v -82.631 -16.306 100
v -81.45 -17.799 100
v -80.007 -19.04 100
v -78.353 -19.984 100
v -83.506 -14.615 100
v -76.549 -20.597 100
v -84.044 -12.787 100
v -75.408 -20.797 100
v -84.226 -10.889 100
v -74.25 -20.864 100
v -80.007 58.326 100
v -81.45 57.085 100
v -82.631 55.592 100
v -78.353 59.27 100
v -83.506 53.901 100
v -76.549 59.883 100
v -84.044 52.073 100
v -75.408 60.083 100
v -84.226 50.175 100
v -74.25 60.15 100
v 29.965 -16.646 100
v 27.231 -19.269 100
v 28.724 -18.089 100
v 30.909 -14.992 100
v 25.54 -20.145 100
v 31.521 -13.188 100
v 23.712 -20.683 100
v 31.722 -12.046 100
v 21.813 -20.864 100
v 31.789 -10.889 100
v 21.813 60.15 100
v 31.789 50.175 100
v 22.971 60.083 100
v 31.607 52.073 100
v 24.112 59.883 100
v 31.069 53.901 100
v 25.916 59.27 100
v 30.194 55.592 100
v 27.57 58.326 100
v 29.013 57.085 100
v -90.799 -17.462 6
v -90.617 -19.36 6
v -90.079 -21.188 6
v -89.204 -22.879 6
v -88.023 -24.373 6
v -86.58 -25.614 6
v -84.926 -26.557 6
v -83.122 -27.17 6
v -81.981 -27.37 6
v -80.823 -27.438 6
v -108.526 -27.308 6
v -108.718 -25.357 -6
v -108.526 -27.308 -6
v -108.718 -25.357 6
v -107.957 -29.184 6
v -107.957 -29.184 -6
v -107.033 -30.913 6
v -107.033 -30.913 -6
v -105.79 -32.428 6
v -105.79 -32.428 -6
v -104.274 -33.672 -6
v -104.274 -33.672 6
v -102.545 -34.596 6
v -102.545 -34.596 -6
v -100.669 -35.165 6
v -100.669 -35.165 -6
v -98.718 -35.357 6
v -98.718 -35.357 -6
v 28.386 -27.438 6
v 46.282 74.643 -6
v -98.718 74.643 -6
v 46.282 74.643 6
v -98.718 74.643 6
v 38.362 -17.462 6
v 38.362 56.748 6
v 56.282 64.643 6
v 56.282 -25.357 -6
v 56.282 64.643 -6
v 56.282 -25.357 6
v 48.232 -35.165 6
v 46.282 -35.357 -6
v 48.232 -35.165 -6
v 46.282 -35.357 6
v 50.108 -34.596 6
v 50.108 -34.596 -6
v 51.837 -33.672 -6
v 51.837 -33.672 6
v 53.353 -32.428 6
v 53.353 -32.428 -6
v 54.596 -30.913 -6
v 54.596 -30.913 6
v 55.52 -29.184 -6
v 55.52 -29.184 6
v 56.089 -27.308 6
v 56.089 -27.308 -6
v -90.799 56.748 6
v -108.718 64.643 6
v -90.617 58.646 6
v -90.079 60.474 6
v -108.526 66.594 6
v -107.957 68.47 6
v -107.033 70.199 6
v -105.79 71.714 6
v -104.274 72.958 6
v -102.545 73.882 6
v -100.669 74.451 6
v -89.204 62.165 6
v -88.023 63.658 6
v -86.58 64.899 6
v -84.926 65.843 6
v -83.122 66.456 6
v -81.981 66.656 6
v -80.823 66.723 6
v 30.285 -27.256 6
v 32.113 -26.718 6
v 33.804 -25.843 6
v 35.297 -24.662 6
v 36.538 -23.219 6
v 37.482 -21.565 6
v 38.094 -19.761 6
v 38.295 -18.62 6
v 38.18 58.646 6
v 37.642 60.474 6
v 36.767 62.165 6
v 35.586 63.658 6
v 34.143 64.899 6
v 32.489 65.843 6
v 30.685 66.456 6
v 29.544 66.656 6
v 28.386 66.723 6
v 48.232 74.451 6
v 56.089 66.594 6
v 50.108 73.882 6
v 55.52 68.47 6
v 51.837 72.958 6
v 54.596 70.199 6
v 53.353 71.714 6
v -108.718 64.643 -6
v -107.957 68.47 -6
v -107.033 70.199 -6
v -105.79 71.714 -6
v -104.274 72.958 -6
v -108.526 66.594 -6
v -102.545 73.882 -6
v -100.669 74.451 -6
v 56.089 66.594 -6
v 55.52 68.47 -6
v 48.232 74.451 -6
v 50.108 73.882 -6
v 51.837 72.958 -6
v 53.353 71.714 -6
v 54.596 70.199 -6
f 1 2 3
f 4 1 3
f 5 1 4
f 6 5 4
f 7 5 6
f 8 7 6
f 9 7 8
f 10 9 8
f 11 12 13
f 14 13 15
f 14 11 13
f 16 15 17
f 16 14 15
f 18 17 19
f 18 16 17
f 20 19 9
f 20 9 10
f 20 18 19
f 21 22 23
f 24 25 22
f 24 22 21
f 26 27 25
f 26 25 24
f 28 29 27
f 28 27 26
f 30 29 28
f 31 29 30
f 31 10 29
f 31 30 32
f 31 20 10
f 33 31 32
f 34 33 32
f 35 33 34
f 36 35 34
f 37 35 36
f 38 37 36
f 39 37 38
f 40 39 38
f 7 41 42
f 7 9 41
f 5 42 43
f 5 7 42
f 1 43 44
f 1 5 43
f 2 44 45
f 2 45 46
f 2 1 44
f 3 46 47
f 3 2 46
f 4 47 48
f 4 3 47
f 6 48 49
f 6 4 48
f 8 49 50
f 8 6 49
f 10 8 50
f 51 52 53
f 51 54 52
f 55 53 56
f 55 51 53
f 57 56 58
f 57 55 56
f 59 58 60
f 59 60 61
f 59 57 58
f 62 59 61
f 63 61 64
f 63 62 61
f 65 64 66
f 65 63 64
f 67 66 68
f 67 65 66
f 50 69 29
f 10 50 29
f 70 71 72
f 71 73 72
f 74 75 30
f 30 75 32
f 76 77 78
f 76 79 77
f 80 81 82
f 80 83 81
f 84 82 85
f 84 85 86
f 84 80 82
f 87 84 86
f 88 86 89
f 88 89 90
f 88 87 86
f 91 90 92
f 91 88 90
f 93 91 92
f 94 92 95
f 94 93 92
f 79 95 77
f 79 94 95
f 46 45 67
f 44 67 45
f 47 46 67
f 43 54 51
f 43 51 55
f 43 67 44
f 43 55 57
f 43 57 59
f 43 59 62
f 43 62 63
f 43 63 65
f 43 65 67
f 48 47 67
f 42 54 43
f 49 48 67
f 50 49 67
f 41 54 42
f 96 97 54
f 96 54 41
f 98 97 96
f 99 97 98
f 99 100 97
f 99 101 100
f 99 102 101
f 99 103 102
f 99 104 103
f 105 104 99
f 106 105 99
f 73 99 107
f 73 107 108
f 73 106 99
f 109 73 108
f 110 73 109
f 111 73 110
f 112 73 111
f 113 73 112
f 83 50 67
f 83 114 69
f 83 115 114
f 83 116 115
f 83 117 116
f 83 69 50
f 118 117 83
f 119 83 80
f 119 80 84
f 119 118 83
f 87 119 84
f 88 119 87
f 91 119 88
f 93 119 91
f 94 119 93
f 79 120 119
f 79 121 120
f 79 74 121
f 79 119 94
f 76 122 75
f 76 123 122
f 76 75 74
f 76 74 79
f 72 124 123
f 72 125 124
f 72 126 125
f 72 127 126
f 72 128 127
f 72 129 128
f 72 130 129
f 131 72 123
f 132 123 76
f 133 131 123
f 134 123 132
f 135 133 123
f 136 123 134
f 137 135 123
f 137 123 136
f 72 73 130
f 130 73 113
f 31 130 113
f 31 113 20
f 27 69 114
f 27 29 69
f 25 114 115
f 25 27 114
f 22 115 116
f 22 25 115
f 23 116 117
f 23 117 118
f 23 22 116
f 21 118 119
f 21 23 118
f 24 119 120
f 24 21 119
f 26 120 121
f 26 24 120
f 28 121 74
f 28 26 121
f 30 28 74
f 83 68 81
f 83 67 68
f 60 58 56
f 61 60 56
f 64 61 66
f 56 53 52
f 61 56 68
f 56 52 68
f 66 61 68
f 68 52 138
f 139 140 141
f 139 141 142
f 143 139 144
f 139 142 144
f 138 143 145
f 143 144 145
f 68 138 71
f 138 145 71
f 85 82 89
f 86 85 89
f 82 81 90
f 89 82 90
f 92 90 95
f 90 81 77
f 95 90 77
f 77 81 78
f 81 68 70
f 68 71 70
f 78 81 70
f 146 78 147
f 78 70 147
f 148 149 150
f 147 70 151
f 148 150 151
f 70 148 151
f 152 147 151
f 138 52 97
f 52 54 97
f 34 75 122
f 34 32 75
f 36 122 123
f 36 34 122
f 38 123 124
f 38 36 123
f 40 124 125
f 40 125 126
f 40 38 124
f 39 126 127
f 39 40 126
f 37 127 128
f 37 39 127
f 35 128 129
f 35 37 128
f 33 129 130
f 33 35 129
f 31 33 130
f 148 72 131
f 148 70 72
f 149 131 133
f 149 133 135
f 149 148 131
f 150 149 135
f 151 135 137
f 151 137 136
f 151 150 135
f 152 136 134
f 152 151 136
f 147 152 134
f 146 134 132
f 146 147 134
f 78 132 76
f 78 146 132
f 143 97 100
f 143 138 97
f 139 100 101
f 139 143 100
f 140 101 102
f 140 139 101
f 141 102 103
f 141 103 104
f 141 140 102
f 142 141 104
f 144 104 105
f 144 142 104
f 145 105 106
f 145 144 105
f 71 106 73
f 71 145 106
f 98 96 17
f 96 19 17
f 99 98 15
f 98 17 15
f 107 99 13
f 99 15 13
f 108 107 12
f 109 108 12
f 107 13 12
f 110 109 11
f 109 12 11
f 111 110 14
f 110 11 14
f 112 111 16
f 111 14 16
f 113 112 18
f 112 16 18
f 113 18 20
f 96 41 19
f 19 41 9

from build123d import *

# Parameters (mm, degrees)
SKETCH1_W           = 130
SKETCH1_H           = 95
BOSS_EXTRUDE1_DEPTH = 100
BOSS_EXTRUDE1_TAPER = 4
SKETCH2_W           = 165
SKETCH2_H           = 110
BOSS_EXTRUDE2_DEPTH = 6
FILLET1_R           = 10
FILLET2_R           = 10


with BuildPart() as part:
    # Sketch1 → Boss-Extrude1 (new body)
    with BuildSketch(Plane.XY):
        with Locations((-26.218487395, 19.642857143)):
            Rectangle(SKETCH1_W, SKETCH1_H)
    extrude(amount=BOSS_EXTRUDE1_DEPTH, taper=BOSS_EXTRUDE1_TAPER)

    # Sketch2 → Boss-Extrude2 (add, symmetric)
    with BuildSketch(Plane.XY):
        with Locations((-26.218487395, 19.642857143)):
            Rectangle(SKETCH2_W, SKETCH2_H)
    extrude(amount=BOSS_EXTRUDE2_DEPTH, both=True)

    # Fillet1
    fillet1_edges = [part.edges().sort_by_distance(p)[0] for p in [
        (-87.512366362, 63.43673611, 53),
        (35.075391572, 63.43673611, 53),
        (35.075391572, -24.151021824, 53),
        (-87.512366362, -24.151021824, 53),
    ]]
    fillet(fillet1_edges, radius=FILLET1_R)

    # Fillet2
    fillet2_edges = [part.edges().sort_by_distance(p)[0] for p in [
        (56.281512605, -35.357142857, 0),
        (56.281512605, 74.642857143, 0),
        (-108.718487395, 74.642857143, 0),
        (-108.718487395, -35.357142857, 0),
    ]]
    fillet(fillet2_edges, radius=FILLET2_R)


solid = part.part
